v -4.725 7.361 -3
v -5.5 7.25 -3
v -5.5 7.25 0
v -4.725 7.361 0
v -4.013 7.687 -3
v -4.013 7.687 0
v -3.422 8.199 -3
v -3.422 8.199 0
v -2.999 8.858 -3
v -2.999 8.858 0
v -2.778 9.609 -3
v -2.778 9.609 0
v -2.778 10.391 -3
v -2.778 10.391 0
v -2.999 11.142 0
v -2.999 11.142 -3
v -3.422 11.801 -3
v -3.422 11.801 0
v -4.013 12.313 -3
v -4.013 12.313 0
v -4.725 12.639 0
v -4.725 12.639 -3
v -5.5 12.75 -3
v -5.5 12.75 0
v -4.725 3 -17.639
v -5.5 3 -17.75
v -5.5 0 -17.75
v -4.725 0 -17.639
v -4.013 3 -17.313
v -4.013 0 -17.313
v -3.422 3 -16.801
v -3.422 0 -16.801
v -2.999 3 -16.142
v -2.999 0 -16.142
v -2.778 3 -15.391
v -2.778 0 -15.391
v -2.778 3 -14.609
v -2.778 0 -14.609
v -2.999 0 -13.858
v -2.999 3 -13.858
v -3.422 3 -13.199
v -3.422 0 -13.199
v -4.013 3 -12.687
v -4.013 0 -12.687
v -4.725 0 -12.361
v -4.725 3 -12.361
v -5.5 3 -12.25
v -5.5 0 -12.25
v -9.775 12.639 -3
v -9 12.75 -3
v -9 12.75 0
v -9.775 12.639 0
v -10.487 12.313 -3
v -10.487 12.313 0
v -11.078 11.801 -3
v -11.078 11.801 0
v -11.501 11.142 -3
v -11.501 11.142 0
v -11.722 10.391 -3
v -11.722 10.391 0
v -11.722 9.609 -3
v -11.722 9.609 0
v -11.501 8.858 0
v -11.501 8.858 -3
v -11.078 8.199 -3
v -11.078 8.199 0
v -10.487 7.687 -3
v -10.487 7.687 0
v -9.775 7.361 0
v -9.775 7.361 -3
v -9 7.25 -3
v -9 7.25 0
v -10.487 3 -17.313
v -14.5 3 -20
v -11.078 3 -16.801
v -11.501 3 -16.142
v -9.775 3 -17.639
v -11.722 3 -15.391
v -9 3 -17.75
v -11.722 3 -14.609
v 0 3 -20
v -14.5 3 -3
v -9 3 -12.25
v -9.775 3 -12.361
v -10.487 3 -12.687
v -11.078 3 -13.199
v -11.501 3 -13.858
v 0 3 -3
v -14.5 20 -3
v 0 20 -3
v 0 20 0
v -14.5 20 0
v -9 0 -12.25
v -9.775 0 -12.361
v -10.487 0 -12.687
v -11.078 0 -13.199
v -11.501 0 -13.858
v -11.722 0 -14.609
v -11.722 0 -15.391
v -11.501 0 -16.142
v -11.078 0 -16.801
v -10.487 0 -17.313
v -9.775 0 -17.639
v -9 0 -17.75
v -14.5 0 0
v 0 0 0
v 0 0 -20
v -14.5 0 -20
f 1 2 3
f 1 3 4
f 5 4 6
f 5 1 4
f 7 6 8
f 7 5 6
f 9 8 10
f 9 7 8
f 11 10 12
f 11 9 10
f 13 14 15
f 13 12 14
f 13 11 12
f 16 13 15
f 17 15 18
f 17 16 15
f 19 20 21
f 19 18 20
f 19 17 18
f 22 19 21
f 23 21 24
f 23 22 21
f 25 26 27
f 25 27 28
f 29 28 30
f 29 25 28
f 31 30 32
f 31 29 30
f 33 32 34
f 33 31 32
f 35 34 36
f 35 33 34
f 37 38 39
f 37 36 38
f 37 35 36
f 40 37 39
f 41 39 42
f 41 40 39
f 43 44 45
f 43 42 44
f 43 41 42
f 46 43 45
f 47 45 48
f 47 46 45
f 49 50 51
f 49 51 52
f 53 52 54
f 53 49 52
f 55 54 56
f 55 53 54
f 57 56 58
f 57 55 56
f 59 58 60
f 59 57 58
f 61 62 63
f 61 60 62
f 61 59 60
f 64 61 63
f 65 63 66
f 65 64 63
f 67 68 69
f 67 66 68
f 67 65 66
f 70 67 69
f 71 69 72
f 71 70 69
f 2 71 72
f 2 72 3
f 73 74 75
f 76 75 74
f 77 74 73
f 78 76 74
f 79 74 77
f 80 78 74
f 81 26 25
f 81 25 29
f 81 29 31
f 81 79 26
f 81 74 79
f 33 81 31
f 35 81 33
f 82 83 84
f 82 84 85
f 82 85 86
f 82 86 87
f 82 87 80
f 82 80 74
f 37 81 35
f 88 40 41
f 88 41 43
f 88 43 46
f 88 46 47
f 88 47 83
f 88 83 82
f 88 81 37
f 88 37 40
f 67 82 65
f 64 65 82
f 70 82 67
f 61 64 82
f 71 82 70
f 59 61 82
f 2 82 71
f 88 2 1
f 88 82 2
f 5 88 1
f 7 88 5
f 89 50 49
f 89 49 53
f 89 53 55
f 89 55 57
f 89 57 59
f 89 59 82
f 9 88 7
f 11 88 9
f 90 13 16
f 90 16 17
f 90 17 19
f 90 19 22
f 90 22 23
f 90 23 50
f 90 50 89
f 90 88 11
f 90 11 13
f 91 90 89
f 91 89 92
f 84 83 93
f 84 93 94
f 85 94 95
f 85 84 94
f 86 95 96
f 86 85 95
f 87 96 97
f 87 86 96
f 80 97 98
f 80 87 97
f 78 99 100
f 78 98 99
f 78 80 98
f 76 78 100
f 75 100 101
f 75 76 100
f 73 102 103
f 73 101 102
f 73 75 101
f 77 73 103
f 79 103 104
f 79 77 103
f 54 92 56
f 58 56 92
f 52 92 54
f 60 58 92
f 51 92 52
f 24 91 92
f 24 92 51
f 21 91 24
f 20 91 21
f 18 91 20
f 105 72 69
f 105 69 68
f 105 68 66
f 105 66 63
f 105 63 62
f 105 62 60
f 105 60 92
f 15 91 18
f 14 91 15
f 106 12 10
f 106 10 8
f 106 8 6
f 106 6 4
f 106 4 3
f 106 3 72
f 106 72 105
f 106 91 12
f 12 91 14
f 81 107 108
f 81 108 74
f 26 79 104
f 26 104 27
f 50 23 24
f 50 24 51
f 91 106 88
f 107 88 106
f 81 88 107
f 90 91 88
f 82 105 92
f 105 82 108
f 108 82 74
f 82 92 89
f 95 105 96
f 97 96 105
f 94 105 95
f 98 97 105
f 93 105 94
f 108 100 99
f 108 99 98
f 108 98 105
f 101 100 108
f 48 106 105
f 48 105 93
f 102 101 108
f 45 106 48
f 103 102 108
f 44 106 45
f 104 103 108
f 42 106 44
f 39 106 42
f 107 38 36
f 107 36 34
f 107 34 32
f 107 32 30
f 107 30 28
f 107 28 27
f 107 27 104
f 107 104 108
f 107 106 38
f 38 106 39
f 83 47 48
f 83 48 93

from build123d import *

# Parameters (mm, degrees)
BOSS_EXTRUDE1_DEPTH = 14.5
CUT_EXTRUDE1_DEPTH  = 4
CUT_EXTRUDE2_DEPTH  = 4


with BuildPart() as part:
    # Sketch1 → Boss-Extrude1 (new body)
    with BuildSketch(Plane(origin=(0, 0, 0), x_dir=(0, 0, -1), z_dir=(1, 0, 0))):
        Polygon((0, 20), (0, 0), (20, 0), (20, 3), (3, 3), (3, 20), align=None)
    extrude(amount=-BOSS_EXTRUDE1_DEPTH)

    # Sketch2 → Cut-Extrude1 (cut, through all)
    with BuildSketch(Plane(origin=(0, 0, -3), x_dir=(-1, 0, 0), z_dir=(0, 0, -1))):
        with BuildLine():
            Line((5.5, 12.75), (9, 12.75))
            ThreePointArc((9, 12.75), (11.75, 10), (9, 7.25))
            Line((9, 7.25), (5.5, 7.25))
            ThreePointArc((5.5, 7.25), (2.75, 10), (5.5, 12.75))
        make_face()
    extrude(amount=-CUT_EXTRUDE1_DEPTH, mode=Mode.SUBTRACT)

    # Sketch3 → Cut-Extrude2 (cut, through all)
    with BuildSketch(Plane(origin=(0, 3, 0), x_dir=(1, 0, 0), z_dir=(0, 1, 0))):
        with BuildLine():
            Line((-5.5, 12.25), (-9, 12.25))
            ThreePointArc((-9, 12.25), (-11.75, 15), (-9, 17.75))
            Line((-9, 17.75), (-5.5, 17.75))
            ThreePointArc((-5.5, 17.75), (-2.75, 15), (-5.5, 12.25))
        make_face()
    extrude(amount=-CUT_EXTRUDE2_DEPTH, mode=Mode.SUBTRACT)


solid = part.part
